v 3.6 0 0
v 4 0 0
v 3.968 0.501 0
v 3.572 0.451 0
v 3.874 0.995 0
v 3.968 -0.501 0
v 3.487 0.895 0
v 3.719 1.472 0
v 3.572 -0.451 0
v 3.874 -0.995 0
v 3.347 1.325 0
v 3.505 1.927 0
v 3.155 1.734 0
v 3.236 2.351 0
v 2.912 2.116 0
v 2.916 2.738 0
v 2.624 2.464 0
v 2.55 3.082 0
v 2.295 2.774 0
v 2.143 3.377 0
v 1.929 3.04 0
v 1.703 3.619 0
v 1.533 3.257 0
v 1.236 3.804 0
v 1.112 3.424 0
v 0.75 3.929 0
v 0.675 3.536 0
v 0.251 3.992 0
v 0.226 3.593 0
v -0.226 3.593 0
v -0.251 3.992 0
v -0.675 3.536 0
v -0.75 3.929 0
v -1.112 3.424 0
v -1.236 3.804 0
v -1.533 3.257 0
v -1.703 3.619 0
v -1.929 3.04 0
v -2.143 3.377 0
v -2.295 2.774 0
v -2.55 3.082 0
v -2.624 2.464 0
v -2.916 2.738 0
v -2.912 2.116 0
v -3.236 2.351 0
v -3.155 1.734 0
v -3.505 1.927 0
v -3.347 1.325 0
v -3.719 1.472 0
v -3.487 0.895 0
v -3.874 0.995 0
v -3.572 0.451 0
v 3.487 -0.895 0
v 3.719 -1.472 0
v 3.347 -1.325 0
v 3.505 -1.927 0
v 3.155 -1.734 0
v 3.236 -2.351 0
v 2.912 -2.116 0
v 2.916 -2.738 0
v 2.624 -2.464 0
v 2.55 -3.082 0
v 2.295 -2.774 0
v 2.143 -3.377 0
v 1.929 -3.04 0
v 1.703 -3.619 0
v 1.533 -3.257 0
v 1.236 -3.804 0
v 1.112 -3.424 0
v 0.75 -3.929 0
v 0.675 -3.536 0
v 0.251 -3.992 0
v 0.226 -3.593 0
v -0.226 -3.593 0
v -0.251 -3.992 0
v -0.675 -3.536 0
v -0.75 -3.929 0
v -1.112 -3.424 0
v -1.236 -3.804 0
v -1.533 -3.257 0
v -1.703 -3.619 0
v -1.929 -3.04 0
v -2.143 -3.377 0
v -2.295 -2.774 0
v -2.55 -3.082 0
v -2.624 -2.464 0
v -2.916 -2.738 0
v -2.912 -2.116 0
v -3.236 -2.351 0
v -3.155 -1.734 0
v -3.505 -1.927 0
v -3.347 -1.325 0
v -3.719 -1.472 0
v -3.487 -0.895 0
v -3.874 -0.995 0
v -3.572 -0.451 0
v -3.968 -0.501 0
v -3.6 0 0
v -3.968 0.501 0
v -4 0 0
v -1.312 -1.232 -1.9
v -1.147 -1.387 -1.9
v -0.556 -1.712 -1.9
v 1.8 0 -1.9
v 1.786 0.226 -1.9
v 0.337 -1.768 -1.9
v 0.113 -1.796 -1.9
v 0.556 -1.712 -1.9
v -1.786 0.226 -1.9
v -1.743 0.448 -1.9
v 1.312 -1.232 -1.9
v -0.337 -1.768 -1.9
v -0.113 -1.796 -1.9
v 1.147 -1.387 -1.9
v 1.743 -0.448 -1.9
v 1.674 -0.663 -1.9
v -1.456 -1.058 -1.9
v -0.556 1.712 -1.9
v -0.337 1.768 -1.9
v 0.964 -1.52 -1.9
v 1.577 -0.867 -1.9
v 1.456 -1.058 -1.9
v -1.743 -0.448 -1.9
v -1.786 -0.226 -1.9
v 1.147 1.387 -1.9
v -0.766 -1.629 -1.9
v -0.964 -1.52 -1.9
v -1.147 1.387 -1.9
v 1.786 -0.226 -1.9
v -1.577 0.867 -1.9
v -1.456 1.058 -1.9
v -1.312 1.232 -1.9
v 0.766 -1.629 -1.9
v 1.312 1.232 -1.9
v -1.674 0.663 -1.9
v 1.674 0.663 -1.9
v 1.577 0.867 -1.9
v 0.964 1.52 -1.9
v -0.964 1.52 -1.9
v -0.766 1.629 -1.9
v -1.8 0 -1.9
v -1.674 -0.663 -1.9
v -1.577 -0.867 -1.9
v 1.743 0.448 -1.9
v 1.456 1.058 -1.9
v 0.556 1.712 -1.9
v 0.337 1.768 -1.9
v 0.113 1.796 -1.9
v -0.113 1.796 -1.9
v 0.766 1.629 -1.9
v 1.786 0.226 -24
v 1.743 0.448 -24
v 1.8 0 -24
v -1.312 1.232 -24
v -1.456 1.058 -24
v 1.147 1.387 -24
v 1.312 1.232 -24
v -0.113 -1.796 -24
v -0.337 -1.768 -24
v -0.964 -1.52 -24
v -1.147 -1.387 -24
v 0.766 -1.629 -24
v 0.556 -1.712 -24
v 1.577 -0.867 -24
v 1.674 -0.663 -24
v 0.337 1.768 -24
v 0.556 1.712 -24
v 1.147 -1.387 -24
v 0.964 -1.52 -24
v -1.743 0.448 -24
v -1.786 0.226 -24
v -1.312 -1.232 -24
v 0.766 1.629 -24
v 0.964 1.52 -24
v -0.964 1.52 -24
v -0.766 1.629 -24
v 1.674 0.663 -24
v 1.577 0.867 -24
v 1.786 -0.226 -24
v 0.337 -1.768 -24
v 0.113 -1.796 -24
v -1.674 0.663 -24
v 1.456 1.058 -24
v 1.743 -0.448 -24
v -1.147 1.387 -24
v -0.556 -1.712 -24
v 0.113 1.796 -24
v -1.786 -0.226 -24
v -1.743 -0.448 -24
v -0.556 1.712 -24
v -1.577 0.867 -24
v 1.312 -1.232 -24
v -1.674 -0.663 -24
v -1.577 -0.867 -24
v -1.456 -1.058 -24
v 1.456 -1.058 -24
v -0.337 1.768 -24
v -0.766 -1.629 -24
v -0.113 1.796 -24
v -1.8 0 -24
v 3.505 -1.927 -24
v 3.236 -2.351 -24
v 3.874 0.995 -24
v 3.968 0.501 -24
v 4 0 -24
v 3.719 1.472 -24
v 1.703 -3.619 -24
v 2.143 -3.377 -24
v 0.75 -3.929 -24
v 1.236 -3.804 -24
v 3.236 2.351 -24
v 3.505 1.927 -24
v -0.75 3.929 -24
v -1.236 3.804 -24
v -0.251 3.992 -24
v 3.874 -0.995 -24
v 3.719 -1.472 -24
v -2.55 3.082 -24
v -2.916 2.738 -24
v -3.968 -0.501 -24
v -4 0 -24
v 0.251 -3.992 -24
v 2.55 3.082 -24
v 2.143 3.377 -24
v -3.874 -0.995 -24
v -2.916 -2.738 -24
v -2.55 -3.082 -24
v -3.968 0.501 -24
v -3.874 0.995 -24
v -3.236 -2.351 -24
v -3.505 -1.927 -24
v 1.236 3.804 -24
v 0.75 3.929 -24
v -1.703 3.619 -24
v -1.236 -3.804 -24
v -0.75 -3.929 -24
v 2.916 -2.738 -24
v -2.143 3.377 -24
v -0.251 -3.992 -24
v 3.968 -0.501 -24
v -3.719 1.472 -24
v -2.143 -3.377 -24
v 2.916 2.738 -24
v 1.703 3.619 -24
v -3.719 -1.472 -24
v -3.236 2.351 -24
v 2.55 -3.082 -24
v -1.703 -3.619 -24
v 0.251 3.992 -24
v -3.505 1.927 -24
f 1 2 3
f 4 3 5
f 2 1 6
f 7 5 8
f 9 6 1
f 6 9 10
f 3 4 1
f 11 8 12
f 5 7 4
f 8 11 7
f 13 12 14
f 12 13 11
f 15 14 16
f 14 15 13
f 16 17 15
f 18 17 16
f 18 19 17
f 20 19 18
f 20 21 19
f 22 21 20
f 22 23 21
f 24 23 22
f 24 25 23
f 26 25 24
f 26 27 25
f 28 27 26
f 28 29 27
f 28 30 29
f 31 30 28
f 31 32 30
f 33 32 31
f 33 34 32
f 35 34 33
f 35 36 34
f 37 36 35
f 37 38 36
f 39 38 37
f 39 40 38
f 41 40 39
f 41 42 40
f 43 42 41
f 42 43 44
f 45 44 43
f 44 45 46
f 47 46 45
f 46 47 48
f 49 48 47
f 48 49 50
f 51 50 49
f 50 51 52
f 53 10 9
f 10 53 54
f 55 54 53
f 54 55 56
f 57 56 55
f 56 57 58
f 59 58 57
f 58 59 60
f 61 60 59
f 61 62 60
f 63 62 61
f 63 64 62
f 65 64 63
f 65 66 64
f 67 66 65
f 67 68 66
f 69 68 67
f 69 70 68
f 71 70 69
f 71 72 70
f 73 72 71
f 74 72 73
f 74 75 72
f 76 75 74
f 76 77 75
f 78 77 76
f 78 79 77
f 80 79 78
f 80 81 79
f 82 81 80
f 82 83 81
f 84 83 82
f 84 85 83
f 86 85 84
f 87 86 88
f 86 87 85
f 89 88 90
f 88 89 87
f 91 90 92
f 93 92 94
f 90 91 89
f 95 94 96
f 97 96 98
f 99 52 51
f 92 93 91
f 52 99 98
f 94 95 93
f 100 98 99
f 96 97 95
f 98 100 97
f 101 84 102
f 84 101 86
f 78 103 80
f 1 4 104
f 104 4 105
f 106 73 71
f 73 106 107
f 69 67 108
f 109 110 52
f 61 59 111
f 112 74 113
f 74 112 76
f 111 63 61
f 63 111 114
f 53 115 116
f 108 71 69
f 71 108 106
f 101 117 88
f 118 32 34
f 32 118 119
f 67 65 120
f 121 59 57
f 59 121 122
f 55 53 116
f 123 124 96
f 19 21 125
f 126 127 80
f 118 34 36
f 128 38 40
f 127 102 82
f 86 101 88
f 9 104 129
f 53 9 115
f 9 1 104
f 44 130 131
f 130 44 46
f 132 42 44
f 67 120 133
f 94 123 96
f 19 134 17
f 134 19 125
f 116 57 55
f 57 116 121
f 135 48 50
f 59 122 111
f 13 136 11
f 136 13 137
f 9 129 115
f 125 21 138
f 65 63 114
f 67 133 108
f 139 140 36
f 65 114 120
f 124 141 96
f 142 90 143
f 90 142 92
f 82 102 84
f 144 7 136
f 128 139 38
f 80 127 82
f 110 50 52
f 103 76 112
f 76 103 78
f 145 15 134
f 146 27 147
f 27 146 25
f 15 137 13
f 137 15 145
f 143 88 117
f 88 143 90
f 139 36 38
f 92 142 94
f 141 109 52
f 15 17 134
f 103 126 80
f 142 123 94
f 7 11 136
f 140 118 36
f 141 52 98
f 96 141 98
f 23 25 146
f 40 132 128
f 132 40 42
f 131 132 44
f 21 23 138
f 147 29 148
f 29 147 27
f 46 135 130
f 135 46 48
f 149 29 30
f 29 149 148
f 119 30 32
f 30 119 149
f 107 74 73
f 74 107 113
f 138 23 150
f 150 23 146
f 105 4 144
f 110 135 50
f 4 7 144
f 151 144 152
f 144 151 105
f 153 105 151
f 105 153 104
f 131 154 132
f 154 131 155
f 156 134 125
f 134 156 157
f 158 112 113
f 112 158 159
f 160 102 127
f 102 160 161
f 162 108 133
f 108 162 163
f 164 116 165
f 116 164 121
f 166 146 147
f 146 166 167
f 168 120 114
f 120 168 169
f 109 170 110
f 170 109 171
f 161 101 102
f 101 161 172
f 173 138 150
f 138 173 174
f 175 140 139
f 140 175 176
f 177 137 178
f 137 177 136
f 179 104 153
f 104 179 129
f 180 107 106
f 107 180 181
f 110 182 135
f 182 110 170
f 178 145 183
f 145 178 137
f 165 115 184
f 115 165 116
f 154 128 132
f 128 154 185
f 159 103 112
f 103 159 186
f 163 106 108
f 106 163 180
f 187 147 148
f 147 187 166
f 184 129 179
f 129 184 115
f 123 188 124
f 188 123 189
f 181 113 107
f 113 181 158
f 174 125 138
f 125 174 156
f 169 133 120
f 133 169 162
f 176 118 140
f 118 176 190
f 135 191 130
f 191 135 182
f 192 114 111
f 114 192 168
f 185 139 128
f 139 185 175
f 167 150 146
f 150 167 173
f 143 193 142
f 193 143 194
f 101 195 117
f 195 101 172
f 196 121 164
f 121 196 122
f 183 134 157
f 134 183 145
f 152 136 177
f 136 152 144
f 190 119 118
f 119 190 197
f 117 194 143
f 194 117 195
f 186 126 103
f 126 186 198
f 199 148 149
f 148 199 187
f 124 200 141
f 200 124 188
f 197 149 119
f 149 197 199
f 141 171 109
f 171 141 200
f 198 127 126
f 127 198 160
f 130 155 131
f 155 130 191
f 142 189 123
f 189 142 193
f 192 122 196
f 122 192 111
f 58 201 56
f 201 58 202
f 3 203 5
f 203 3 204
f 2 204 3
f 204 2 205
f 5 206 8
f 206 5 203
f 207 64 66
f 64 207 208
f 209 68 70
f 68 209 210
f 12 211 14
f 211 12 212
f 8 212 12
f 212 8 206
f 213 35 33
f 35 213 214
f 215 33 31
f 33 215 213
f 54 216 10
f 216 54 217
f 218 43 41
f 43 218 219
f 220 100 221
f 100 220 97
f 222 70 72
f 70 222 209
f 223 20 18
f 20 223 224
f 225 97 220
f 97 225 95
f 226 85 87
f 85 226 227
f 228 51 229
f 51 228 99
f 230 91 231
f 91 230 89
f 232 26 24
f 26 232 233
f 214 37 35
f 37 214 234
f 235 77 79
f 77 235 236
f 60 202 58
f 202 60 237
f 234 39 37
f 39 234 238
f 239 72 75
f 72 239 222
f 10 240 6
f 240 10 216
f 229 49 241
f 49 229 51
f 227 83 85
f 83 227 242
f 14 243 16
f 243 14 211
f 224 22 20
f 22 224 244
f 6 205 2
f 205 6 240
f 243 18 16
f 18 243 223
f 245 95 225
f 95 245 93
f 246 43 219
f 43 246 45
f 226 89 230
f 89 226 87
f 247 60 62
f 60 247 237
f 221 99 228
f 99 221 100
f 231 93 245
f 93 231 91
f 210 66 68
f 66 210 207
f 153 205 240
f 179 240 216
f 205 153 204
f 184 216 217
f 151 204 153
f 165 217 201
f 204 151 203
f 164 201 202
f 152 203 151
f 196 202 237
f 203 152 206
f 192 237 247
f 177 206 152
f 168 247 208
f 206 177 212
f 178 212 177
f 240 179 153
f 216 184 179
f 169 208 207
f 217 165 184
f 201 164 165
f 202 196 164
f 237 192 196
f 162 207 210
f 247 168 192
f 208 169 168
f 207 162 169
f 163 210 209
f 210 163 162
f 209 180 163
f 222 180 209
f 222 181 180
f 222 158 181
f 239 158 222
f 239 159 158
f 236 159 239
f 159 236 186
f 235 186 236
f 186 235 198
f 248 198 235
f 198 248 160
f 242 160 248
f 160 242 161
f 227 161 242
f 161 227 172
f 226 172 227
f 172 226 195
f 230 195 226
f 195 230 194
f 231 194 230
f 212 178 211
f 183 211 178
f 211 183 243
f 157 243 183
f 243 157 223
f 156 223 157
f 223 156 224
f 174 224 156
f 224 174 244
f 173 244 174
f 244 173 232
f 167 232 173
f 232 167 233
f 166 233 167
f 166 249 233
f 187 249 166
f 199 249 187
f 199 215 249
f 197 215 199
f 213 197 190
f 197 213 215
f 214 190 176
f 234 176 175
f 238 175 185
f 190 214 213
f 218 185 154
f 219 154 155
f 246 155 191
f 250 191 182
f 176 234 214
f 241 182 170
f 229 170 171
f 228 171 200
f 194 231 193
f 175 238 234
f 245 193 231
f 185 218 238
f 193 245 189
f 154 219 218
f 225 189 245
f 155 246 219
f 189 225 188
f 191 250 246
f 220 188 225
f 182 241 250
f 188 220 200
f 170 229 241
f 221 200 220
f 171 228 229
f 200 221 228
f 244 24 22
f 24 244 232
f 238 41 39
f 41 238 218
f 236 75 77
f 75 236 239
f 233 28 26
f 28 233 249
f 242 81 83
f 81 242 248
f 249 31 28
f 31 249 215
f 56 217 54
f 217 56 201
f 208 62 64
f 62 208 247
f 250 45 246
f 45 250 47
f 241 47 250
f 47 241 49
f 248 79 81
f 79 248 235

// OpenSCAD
$fn = 50;

difference() {
	union() {
		translate(v = [0, 0, -24.0]) {
			cylinder(h = 24, r = 4.0);
		}
	}
	union() {
		translate(v = [0, 0, 0]) {
			rotate(a = [0, 0, 0]) {
				difference() {
					union() {
						translate(v = [0, 0, -27.0]) {
							cylinder(h = 27, r = 1.5);
						}
						translate(v = [0, 0, -1.9]) {
							cylinder(h = 1.9, r1 = 1.8, r2 = 3.6);
						}
						translate(v = [0, 0, -27.0]) {
							cylinder(h = 27, r = 1.8);
						}
						translate(v = [0, 0, -27.0]) {
							cylinder(h = 27, r = 1.5);
						}
					}
					union();
				}
			}
		}
	}
}
